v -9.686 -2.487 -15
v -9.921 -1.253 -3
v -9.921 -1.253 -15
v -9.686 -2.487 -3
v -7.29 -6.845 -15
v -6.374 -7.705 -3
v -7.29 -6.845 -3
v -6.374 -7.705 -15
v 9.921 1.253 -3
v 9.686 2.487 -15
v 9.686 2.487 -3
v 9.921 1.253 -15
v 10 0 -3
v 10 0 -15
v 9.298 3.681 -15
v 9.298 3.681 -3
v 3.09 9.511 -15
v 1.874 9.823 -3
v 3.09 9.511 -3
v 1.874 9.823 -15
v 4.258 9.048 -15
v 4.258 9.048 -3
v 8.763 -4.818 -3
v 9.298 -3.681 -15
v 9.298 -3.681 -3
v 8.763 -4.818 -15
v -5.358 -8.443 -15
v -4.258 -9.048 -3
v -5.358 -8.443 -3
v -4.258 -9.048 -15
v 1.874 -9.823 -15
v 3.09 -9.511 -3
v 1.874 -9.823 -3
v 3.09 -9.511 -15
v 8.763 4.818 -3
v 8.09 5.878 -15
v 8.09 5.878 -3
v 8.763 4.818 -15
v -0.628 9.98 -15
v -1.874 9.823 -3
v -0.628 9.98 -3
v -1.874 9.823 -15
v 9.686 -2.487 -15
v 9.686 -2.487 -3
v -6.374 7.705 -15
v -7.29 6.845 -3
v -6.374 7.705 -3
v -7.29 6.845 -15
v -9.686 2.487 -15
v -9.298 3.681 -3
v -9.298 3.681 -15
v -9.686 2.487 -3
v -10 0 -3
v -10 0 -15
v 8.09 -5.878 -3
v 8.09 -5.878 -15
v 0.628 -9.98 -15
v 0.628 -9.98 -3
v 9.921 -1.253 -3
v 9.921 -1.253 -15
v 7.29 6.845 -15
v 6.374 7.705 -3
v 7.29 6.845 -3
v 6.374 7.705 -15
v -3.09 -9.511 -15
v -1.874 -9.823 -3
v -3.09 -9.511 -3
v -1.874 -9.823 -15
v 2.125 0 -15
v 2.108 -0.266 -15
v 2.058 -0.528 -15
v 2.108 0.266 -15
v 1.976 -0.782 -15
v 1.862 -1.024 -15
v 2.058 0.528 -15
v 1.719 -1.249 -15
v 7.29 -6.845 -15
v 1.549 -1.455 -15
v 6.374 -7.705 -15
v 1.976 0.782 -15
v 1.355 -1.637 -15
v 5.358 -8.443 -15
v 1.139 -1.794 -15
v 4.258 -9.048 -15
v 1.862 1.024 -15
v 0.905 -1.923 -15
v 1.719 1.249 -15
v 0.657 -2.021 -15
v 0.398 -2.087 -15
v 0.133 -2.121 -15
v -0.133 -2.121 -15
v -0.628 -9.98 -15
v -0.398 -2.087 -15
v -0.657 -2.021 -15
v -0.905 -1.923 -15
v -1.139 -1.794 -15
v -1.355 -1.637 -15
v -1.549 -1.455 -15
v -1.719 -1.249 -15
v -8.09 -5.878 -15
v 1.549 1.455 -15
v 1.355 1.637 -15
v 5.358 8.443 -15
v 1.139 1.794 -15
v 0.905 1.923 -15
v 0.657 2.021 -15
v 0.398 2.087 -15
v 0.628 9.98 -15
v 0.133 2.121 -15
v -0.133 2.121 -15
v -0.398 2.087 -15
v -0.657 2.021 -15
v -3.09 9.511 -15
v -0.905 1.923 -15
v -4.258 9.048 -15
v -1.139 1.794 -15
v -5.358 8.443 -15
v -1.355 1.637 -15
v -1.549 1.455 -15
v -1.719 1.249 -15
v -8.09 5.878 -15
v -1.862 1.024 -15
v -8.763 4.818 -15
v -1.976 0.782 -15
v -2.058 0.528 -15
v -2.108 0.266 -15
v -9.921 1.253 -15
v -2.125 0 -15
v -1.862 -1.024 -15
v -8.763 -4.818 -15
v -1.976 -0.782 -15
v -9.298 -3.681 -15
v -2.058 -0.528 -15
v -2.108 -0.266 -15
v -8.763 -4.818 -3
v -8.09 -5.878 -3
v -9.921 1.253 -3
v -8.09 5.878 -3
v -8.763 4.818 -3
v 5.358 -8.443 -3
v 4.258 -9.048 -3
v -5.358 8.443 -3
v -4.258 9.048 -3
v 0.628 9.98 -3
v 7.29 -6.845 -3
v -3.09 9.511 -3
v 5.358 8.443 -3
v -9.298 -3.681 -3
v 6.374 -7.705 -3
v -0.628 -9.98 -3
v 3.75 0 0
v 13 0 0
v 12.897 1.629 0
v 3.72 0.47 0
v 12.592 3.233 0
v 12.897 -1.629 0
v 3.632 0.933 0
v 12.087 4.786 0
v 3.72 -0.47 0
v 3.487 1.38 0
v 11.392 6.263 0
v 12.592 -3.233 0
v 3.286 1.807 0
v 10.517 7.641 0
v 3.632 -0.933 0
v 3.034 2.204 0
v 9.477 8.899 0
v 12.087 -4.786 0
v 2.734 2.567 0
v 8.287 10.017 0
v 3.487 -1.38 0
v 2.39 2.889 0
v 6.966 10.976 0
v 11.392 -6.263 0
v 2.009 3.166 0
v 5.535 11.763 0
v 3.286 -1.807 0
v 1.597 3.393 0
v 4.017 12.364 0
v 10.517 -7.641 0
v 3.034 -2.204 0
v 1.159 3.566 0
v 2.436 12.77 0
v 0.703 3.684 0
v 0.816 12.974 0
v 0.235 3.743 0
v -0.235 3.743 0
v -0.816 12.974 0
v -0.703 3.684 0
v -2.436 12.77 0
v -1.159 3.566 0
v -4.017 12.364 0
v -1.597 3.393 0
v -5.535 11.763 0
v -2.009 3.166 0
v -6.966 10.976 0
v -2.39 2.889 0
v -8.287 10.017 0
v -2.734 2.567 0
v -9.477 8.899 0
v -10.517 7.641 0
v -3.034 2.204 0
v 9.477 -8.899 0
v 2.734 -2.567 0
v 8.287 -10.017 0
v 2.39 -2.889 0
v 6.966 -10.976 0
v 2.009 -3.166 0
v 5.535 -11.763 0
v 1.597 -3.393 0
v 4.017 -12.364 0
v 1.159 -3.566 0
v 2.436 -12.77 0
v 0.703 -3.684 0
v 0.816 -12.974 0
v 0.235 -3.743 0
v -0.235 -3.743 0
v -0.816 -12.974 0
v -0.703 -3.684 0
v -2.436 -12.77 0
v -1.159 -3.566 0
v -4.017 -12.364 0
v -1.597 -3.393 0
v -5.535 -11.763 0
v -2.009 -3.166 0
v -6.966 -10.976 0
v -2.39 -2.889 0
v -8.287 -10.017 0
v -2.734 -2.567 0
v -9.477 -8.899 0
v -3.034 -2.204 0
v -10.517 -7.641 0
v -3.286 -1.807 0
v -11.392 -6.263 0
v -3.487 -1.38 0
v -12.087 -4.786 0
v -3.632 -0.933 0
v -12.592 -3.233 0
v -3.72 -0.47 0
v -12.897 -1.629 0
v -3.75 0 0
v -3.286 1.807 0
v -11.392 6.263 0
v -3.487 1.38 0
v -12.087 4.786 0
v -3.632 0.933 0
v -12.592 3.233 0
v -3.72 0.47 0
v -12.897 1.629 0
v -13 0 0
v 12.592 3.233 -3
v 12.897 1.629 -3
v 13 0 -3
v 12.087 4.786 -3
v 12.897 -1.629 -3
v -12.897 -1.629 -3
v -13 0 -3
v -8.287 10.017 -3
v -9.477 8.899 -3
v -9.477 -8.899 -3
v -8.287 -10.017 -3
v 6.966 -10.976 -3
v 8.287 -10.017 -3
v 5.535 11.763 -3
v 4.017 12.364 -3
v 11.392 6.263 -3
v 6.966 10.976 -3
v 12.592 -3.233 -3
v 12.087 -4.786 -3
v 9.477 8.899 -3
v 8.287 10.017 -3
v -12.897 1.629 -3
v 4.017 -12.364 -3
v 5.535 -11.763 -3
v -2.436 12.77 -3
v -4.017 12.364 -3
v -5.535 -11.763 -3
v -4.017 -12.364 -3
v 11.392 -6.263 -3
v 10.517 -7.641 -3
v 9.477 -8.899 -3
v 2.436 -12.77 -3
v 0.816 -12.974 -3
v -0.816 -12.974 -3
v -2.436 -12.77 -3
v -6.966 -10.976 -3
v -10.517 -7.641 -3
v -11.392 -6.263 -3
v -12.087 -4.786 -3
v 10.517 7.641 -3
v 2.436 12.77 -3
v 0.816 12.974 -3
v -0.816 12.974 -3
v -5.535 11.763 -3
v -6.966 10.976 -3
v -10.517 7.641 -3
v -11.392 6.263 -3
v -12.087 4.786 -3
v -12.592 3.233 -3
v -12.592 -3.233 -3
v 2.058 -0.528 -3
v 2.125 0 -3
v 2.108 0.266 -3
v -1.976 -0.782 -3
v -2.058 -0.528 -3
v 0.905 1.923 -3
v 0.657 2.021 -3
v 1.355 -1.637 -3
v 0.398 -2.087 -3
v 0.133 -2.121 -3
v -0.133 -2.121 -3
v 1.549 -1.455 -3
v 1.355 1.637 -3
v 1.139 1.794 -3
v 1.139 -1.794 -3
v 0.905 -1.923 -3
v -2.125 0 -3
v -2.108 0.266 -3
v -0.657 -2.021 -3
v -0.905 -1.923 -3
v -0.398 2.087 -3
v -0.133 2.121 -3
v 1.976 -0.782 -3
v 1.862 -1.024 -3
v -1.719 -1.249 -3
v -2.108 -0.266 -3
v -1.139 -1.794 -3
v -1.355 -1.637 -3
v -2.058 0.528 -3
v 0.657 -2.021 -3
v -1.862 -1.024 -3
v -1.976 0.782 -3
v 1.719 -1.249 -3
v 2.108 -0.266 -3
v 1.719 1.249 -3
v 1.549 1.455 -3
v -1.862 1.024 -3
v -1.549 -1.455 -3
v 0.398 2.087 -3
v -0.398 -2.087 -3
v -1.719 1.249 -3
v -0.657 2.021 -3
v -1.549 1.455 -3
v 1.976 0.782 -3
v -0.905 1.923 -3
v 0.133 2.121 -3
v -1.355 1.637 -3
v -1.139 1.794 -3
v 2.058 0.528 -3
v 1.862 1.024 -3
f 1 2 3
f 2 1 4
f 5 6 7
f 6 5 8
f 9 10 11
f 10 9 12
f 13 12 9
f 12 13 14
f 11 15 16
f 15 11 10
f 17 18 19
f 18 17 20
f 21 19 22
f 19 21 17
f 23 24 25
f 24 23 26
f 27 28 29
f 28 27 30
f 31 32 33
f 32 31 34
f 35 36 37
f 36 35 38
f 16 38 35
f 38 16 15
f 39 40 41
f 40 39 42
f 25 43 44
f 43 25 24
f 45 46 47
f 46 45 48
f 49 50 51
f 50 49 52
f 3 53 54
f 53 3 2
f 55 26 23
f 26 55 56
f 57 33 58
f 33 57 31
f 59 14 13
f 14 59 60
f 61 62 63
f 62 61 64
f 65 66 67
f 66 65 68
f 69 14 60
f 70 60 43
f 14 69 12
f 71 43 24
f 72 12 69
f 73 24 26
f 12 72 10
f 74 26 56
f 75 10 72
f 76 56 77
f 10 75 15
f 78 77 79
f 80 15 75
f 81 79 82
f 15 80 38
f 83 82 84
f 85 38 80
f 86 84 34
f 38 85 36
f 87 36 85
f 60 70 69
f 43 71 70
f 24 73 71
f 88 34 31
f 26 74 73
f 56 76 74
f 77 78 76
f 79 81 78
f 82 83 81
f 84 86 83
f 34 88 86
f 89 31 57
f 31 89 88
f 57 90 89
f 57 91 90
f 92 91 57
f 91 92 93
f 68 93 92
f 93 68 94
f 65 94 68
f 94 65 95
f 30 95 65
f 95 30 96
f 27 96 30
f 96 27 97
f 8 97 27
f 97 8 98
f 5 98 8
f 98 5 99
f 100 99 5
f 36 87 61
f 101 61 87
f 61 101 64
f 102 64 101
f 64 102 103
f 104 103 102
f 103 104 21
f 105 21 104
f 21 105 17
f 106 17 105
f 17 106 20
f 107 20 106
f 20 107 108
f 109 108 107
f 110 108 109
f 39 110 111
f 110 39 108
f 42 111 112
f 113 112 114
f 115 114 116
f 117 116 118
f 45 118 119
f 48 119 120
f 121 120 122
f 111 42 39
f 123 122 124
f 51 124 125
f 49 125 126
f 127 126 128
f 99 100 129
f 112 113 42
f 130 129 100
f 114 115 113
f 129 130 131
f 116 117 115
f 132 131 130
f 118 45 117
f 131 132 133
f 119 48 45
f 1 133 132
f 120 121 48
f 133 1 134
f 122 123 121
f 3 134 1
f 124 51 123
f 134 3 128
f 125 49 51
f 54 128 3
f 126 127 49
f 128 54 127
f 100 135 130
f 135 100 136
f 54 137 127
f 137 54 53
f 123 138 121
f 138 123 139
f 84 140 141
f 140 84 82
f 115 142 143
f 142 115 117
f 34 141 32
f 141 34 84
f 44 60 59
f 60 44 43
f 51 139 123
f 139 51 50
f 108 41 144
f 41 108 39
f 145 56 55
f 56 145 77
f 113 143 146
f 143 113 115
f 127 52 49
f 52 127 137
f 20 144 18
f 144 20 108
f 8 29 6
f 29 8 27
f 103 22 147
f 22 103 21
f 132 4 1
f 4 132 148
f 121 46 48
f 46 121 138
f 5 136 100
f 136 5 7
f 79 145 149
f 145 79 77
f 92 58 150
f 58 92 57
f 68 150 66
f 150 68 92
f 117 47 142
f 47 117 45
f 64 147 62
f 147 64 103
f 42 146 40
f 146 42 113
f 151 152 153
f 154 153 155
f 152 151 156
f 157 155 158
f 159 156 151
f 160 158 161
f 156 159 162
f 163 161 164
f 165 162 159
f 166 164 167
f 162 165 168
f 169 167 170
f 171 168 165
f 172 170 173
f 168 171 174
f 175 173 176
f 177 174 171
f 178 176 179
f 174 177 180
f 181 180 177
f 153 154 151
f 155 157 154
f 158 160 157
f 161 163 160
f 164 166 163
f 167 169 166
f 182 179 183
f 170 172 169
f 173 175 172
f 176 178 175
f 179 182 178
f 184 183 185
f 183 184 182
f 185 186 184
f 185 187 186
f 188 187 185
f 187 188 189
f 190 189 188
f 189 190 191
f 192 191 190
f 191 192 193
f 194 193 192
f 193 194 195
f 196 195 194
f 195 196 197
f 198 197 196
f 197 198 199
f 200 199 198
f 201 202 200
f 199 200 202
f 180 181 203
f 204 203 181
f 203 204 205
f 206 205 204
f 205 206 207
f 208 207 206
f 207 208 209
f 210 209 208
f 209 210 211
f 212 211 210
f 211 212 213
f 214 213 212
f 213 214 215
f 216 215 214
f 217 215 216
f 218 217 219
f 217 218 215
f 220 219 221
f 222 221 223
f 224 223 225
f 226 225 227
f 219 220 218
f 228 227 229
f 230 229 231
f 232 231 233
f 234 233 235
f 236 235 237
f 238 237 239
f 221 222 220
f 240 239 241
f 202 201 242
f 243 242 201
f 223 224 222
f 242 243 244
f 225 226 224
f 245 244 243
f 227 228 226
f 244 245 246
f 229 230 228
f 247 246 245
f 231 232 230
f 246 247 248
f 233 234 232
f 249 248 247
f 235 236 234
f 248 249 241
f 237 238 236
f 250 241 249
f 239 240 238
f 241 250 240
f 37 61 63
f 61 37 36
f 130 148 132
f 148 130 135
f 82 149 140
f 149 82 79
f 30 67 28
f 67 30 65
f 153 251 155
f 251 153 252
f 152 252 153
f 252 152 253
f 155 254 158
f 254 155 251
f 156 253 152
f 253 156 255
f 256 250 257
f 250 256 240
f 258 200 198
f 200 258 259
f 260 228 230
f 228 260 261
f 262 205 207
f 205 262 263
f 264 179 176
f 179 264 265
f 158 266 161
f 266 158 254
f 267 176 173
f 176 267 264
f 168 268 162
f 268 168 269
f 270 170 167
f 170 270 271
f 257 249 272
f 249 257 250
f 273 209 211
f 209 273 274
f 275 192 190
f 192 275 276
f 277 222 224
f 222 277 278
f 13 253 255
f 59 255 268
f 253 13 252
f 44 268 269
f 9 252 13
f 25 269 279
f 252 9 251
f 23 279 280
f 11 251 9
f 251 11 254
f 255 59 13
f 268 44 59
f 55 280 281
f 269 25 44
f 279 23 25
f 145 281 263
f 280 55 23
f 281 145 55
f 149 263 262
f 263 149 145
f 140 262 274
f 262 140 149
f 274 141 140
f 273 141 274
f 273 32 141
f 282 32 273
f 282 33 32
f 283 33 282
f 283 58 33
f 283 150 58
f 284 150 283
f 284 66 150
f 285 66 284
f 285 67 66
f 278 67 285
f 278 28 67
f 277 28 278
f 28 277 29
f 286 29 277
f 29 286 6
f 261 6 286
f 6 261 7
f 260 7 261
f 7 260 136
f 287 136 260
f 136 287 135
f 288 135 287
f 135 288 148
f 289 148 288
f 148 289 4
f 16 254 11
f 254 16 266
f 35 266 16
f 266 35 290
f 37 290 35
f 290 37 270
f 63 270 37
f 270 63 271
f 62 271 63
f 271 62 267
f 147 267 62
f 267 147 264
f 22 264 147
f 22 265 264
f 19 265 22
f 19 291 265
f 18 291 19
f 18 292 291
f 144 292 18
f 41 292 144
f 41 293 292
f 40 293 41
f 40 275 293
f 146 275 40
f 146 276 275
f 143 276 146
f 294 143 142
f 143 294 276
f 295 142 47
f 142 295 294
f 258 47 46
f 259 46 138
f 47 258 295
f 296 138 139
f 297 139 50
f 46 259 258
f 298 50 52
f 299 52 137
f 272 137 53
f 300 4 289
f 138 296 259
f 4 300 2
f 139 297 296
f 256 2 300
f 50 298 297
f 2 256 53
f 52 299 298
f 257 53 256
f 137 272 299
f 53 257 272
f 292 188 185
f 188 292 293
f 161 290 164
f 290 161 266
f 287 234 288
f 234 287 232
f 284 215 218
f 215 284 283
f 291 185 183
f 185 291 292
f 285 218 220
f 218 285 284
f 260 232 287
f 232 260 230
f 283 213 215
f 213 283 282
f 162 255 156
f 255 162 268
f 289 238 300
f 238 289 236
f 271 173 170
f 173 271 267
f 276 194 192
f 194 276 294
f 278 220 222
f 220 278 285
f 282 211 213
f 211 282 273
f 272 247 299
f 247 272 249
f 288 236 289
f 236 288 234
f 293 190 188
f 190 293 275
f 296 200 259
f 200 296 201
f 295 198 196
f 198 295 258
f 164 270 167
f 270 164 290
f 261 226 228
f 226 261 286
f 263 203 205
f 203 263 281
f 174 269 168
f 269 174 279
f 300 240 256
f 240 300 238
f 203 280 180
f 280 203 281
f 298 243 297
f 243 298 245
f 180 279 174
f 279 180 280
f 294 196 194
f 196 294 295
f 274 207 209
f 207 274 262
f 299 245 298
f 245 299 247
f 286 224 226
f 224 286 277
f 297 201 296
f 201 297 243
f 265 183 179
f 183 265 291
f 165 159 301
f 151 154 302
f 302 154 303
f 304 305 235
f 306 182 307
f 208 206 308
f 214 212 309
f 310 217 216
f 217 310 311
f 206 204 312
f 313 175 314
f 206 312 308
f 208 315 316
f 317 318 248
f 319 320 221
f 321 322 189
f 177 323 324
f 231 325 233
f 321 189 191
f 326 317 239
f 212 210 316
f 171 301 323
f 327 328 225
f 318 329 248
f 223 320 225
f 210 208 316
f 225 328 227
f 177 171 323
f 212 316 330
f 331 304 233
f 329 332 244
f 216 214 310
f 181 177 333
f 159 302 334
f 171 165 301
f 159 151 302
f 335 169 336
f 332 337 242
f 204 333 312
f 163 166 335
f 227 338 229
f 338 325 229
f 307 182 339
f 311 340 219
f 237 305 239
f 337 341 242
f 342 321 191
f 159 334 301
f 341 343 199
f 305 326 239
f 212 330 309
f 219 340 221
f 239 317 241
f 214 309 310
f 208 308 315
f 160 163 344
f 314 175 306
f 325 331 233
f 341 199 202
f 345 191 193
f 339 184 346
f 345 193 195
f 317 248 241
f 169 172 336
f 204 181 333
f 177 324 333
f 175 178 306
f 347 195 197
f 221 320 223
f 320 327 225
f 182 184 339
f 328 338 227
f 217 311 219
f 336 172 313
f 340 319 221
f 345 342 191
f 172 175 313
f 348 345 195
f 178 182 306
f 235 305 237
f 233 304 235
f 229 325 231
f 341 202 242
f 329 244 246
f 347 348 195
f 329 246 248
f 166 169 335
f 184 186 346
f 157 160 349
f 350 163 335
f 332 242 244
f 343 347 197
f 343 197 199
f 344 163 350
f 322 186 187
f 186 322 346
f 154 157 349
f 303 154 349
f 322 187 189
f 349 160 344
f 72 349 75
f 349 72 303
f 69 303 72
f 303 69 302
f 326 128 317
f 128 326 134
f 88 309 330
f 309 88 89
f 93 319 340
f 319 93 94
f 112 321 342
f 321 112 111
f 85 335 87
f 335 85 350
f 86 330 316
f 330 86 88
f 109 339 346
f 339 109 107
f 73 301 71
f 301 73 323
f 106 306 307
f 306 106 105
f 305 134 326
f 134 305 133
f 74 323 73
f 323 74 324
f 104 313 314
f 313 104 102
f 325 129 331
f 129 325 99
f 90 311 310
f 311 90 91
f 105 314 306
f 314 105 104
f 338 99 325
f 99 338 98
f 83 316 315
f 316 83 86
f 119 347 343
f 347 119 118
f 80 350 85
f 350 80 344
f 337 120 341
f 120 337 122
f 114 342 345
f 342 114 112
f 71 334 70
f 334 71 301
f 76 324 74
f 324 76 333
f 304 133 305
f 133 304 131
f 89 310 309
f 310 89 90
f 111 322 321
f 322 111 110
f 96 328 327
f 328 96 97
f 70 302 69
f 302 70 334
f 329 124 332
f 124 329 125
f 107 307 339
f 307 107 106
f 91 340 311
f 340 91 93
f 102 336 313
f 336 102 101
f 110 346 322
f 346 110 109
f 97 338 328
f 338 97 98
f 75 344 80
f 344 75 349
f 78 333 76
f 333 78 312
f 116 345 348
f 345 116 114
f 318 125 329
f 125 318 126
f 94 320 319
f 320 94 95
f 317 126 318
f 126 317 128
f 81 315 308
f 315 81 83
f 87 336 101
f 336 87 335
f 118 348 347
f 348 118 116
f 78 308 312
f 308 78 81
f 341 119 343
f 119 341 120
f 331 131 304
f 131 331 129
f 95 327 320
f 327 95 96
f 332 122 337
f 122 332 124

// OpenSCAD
$fn = 50;


difference() {
	union() {
		translate(v = [0, 0, -15.0000000000]) {
			cylinder(h = 15, r = 10.0000000000);
		}
		translate(v = [0, 0, -3.0000000000]) {
			cylinder(h = 3, r = 13.0000000000);
		}
	}
	union() {
		translate(v = [0, 0, 0]) {
			rotate(a = [0, 0, 0]) {
				difference() {
					union() {
						#translate(v = [0, 0, -15.0000000000]) {
							cylinder(h = 15, r = 2.0000000000);
						}
						#translate(v = [0, 0, -3]) {
							cylinder(h = 3, r1 = 2.1250000000, r2 = 3.7500000000);
						}
						#translate(v = [0, 0, -15.0000000000]) {
							cylinder(h = 15, r = 2.1250000000);
						}
						#translate(v = [0, 0, -15.0000000000]) {
							cylinder(h = 15, r = 2.0000000000);
						}
					}
					union();
				}
			}
		}
	}
}
